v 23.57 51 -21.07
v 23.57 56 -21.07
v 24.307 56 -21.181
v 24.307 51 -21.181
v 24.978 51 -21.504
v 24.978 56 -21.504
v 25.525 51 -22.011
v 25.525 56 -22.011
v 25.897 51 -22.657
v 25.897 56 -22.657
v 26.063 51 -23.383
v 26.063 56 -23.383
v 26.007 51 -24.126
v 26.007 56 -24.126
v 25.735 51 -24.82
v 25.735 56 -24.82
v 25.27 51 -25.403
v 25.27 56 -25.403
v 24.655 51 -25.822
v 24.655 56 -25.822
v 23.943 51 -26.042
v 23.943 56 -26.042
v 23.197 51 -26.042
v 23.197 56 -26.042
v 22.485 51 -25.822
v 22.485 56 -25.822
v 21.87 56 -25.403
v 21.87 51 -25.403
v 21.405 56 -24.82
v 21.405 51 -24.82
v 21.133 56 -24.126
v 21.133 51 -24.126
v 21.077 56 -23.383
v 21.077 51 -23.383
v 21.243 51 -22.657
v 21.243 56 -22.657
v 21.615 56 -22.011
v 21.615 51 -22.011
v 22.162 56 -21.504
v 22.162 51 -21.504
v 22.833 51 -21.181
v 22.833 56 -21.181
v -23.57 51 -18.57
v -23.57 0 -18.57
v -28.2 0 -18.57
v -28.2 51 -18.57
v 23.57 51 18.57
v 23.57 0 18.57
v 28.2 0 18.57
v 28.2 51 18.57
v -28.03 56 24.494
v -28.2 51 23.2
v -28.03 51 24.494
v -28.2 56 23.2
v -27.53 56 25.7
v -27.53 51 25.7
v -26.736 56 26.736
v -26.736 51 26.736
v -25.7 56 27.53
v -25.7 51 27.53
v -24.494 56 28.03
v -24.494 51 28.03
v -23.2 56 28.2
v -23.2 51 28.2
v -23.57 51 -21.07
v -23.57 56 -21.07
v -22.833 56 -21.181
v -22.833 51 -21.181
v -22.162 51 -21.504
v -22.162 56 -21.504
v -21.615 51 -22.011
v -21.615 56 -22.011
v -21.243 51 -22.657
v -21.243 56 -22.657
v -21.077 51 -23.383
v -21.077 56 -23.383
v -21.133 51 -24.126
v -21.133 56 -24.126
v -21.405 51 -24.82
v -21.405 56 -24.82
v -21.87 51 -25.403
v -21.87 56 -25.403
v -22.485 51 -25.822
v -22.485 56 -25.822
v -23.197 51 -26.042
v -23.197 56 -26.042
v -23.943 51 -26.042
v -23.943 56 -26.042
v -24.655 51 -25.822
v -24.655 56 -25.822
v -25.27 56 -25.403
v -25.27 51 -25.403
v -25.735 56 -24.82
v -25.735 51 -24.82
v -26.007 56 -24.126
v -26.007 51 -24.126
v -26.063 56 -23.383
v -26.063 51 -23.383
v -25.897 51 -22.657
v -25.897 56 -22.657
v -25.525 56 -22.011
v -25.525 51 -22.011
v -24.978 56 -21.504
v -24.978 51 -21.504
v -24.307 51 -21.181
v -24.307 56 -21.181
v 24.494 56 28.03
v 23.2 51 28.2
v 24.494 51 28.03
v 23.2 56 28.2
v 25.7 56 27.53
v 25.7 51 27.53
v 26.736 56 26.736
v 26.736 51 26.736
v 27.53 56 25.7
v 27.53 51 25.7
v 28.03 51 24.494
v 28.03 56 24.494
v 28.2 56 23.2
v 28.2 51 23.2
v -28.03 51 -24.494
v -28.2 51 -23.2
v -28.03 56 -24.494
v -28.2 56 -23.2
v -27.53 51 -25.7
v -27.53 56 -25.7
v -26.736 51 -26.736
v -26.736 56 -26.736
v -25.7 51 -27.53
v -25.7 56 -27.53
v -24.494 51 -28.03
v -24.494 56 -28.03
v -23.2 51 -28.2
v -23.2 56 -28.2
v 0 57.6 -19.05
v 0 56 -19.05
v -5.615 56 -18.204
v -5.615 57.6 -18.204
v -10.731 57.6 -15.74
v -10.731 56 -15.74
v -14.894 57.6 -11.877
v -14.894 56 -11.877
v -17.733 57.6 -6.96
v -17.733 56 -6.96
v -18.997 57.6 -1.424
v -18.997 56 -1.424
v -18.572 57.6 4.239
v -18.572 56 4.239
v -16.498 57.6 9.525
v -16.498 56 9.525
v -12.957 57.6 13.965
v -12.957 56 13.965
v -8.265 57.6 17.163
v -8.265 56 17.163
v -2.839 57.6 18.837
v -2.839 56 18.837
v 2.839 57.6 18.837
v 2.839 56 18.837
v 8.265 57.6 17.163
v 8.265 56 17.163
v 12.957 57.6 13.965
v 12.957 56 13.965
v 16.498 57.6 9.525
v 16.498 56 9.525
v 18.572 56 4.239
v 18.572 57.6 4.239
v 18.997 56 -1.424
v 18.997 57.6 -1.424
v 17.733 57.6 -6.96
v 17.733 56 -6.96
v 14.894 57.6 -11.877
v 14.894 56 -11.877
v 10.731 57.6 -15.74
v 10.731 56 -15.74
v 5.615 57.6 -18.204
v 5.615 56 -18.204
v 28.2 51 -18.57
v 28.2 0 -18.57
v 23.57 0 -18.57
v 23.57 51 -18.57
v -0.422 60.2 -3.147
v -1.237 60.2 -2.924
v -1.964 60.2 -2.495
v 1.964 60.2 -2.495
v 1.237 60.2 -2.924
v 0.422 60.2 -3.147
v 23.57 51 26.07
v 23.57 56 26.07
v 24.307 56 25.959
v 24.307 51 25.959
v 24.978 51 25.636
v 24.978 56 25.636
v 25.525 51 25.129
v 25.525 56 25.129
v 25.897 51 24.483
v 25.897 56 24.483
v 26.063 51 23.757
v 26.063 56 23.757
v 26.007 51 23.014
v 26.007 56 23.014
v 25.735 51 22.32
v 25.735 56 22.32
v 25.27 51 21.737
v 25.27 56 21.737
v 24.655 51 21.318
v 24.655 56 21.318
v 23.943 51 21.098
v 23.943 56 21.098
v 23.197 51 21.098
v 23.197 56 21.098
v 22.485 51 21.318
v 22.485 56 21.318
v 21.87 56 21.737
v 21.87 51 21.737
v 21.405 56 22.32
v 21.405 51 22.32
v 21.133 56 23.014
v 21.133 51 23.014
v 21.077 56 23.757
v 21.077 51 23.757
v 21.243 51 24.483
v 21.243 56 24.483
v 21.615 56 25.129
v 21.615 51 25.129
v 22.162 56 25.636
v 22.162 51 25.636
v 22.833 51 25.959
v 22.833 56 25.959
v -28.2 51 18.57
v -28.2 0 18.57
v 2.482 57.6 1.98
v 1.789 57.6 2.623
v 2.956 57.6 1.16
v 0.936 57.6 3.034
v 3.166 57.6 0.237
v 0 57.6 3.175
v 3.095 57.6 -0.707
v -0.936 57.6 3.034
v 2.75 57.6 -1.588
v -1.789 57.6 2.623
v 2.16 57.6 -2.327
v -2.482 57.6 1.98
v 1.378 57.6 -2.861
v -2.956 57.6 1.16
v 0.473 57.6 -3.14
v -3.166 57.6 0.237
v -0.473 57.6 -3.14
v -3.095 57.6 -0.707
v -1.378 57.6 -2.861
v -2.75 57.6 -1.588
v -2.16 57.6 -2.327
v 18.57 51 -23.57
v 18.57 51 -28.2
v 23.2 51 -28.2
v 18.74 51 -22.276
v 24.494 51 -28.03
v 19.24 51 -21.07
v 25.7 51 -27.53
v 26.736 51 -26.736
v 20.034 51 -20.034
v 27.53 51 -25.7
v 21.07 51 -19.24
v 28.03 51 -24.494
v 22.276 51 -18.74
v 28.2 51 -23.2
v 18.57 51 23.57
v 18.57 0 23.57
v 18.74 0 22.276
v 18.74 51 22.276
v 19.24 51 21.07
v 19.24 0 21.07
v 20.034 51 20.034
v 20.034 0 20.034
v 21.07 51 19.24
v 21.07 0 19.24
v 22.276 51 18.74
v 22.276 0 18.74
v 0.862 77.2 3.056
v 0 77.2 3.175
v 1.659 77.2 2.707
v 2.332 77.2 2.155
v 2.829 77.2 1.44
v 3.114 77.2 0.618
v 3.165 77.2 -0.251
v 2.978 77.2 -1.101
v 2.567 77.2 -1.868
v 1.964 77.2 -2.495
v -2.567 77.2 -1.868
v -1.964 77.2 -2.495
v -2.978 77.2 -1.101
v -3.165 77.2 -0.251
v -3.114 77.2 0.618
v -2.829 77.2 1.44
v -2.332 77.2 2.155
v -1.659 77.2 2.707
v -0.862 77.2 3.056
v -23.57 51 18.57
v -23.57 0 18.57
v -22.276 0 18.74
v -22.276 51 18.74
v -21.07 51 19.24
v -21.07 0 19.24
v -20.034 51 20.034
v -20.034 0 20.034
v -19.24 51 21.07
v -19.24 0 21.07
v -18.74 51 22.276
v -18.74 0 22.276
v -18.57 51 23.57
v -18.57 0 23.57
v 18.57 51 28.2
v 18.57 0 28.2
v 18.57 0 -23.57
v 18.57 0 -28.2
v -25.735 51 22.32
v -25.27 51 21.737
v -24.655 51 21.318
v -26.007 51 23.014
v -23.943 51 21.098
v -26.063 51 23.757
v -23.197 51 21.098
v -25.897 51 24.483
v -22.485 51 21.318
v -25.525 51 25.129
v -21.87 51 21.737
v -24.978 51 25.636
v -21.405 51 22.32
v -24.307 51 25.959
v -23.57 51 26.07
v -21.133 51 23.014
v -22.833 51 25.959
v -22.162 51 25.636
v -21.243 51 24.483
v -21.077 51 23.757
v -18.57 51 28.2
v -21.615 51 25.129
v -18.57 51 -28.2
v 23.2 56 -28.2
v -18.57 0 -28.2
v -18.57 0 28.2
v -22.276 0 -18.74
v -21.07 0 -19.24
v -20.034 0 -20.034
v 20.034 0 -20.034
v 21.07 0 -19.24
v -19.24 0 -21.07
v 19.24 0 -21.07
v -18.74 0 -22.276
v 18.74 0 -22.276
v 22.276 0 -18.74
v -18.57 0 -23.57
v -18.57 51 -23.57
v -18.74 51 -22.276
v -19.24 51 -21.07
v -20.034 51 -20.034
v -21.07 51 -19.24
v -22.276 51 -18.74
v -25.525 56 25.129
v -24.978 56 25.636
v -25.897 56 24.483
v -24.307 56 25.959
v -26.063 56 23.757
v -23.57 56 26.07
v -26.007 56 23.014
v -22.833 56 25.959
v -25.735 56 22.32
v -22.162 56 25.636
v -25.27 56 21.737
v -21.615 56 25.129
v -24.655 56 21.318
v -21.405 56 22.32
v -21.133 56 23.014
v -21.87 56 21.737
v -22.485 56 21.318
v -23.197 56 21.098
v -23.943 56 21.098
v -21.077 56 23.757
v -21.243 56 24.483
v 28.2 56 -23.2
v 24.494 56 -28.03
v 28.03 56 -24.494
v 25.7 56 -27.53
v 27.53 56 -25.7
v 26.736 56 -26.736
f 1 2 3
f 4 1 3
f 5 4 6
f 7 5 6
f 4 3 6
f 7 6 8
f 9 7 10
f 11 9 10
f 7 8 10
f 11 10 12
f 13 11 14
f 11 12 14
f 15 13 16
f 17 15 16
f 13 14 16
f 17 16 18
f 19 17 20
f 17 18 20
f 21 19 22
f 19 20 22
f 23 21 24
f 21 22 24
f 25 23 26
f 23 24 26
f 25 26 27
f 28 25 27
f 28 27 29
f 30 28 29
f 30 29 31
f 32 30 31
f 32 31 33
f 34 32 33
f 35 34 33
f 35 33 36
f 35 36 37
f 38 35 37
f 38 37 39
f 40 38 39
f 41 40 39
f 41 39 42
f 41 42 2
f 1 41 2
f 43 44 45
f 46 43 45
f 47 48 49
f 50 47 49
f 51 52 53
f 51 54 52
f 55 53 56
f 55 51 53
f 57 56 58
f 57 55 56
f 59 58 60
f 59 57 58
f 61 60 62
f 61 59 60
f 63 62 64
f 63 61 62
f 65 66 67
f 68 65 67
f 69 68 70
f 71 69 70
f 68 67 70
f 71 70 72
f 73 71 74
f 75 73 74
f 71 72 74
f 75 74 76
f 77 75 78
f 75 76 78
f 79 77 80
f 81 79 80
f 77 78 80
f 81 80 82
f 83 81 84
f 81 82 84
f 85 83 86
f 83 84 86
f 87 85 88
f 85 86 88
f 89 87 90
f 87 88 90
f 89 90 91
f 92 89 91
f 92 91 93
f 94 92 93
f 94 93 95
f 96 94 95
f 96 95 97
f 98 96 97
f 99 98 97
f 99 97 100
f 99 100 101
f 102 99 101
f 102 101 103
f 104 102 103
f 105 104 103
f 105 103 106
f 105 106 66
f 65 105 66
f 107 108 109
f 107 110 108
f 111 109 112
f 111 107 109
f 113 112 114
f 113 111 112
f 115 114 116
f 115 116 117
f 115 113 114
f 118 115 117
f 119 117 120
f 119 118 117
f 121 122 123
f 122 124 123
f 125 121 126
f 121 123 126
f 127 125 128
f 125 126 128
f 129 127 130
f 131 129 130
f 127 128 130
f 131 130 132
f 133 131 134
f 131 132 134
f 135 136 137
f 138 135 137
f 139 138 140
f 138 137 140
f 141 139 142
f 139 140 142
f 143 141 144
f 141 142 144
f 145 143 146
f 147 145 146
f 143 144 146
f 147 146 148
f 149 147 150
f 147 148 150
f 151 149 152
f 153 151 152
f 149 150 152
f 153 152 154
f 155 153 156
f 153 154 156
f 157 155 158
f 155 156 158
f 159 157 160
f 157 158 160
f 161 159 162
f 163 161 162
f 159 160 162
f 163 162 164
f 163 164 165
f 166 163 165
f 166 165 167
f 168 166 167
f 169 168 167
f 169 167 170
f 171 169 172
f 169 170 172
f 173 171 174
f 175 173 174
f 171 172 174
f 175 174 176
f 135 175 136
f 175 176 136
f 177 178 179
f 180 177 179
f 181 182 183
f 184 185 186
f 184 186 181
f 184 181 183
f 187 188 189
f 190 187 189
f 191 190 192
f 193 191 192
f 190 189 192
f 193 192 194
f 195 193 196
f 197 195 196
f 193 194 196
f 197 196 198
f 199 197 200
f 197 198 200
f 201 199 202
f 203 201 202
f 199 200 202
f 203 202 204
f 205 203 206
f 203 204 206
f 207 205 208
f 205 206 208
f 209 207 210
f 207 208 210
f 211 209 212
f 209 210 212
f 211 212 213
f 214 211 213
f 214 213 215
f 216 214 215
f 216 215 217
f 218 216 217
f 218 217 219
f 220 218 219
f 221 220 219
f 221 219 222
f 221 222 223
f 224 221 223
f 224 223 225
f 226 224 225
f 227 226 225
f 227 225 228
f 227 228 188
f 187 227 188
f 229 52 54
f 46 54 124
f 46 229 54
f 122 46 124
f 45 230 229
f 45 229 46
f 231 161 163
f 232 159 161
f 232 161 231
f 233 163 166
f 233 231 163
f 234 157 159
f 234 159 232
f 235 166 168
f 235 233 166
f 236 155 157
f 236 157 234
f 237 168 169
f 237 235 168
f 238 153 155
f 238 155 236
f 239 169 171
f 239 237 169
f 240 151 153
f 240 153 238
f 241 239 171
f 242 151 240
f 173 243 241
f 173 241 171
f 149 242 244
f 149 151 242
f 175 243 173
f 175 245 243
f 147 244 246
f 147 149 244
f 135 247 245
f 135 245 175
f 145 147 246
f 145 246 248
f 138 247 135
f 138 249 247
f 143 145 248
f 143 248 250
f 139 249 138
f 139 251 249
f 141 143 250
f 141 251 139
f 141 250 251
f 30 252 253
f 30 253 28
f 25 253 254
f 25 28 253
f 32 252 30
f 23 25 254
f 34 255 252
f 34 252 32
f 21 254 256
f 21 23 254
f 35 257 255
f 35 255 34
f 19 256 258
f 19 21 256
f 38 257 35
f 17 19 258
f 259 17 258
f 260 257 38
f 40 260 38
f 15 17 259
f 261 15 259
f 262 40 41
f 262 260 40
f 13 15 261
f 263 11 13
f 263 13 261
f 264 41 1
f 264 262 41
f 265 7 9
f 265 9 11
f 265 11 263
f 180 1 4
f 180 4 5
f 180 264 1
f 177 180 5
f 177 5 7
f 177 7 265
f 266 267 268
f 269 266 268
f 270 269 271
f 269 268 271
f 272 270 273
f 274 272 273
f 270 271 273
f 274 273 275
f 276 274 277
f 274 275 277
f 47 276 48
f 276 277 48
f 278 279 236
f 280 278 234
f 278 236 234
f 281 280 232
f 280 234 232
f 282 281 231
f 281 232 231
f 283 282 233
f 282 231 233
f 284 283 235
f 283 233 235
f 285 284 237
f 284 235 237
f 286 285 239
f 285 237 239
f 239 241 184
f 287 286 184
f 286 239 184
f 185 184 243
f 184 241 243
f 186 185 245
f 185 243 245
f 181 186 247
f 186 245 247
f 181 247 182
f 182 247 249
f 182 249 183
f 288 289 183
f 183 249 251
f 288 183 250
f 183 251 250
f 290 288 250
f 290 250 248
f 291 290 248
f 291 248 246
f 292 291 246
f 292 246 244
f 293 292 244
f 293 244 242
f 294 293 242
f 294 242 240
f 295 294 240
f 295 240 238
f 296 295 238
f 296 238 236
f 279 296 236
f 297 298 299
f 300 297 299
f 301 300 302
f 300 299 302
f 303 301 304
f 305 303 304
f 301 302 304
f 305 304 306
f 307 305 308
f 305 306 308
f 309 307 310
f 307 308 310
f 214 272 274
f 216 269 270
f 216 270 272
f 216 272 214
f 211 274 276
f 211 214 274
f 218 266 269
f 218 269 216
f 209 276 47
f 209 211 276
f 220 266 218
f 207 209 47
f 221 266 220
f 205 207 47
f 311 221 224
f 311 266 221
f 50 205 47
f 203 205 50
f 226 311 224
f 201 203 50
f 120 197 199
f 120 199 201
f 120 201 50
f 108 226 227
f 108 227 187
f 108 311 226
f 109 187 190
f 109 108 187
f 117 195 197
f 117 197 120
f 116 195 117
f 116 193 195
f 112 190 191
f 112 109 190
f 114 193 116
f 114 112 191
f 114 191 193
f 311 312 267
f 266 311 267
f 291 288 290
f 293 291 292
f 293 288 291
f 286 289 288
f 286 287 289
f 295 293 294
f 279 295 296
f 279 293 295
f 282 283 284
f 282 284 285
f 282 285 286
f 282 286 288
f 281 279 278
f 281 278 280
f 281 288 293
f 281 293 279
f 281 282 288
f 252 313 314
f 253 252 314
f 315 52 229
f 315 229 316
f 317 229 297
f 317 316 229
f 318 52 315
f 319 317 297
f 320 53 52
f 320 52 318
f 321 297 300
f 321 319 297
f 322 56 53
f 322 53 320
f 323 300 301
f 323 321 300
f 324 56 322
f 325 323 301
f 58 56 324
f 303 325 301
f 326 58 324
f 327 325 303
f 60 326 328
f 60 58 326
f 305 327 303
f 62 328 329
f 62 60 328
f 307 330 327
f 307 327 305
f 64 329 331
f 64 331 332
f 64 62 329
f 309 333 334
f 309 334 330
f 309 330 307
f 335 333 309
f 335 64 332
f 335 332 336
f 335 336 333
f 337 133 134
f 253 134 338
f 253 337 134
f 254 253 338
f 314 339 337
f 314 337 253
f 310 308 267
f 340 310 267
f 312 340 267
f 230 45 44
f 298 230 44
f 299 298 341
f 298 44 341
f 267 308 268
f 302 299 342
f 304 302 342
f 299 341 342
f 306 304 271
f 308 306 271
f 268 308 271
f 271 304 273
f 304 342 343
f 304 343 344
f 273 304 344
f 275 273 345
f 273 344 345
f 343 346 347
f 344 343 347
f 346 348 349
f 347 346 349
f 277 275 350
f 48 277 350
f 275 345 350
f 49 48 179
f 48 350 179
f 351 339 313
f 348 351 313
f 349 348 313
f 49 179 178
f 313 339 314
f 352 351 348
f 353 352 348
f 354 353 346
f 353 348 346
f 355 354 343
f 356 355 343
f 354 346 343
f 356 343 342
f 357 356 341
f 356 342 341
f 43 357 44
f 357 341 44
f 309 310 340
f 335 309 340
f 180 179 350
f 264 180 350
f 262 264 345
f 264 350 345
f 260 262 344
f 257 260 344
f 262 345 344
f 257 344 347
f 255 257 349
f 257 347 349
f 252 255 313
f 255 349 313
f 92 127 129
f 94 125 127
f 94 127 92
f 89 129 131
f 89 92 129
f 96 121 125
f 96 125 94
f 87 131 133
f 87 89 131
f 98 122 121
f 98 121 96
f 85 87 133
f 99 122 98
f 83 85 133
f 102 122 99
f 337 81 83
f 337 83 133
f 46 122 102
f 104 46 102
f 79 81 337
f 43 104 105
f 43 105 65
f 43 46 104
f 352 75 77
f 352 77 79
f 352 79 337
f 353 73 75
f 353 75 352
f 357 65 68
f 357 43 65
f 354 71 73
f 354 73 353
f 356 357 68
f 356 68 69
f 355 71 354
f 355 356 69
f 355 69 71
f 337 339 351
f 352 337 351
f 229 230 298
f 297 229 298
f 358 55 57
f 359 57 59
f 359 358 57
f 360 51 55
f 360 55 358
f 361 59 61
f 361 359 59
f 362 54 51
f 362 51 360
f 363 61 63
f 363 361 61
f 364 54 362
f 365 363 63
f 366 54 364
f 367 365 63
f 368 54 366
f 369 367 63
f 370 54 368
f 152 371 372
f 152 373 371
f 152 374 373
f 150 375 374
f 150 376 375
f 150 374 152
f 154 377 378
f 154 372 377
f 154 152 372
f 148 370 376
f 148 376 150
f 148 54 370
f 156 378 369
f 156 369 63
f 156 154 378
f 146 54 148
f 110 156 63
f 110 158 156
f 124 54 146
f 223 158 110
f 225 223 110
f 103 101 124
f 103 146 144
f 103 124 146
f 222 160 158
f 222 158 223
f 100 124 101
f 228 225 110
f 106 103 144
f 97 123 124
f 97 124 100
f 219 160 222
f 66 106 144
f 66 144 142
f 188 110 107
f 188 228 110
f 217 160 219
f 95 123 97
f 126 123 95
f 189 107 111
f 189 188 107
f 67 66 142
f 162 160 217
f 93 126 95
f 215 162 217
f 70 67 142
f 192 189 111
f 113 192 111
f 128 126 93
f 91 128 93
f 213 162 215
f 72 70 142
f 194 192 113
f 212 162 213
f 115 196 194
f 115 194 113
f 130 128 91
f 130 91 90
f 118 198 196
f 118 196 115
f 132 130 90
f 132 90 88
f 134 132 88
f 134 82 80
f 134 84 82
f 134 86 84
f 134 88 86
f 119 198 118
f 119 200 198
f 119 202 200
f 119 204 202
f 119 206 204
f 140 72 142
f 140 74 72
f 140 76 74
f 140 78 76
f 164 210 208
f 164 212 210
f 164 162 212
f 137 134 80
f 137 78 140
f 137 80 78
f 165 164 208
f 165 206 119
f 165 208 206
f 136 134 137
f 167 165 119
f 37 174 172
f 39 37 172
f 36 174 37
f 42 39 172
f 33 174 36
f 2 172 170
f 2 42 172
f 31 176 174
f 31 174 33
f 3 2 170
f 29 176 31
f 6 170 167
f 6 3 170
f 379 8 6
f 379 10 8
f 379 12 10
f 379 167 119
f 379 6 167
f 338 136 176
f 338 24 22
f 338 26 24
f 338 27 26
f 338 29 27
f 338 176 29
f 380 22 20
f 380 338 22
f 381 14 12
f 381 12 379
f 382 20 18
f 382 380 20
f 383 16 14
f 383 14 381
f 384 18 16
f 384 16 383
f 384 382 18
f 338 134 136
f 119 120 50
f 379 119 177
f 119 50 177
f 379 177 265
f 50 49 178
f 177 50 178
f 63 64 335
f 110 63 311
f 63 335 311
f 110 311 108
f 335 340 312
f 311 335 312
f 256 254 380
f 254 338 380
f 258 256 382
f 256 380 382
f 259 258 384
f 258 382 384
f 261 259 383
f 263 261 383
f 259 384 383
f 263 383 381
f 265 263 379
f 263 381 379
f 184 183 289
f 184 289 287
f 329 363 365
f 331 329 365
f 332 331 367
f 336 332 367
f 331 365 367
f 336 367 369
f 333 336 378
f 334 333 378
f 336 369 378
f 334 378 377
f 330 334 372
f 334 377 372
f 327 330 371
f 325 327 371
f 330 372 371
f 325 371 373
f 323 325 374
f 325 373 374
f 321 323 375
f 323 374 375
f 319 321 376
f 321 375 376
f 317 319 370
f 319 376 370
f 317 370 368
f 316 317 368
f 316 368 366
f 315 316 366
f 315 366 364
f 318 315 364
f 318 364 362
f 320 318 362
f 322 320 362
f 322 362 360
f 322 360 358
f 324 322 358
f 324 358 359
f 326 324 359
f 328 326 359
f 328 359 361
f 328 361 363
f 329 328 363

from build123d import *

# Parameters (mm, degrees)
SKETCH1_W           = 56.4
SKETCH1_H           = 56.4
BOSS_EXTRUDE1_DEPTH = 56
SKETCH2_R           = 2.5
CUT_EXTRUDE1_DEPTH  = 56
CUT_EXTRUDE2_DEPTH  = 51
FILLET1_R           = 5
SKETCH5_R           = 19.05
BOSS_EXTRUDE2_DEPTH = 1.6
SKETCH6_R           = 3.175
BOSS_EXTRUDE3_DEPTH = 19.6
CUT_EXTRUDE3_START  = -17
CUT_EXTRUDE3_DEPTH  = 17


with BuildPart() as part:
    # Sketch1 → Boss-Extrude1 (new body)
    with BuildSketch(Plane(origin=(0, 0, 0), x_dir=(1, 0, 0), z_dir=(0, 1, 0))):
        Rectangle(SKETCH1_W, SKETCH1_H)
    extrude(amount=BOSS_EXTRUDE1_DEPTH)

    # Sketch2 → Cut-Extrude1 (cut)
    with BuildSketch(Plane(origin=(0, 56, 0), x_dir=(1, 0, 0), z_dir=(0, 1, 0))):
        with Locations(Location((-23.57, 23.57, 0), (0, 0, 270))):
            Circle(SKETCH2_R)
        with Locations(Location((23.57, 23.57, 0), (0, 0, 270))):
            Circle(SKETCH2_R)
        with Locations(Location((23.57, -23.57, 0), (0, 0, 270))):
            Circle(SKETCH2_R)
        with Locations(Location((-23.57, -23.57, 0), (0, 0, 270))):
            Circle(SKETCH2_R)
    extrude(amount=-CUT_EXTRUDE1_DEPTH, mode=Mode.SUBTRACT)

    # Sketch4 → Cut-Extrude2 (cut)
    with BuildSketch(Plane.XZ):
        with BuildLine():
            Line((-18.57, 23.57), (-18.57, 28.2))
            Line((-18.57, 28.2), (-28.2, 28.2))
            Line((-28.2, 28.2), (-28.2, 18.57))
            Line((-28.2, 18.57), (-23.57, 18.57))
            ThreePointArc((-23.57, 18.57), (-20.034466094, 20.034466094), (-18.57, 23.57))
        make_face()
        with BuildLine():
            Line((23.57, 18.57), (28.2, 18.57))
            Line((28.2, 18.57), (28.2, 28.2))
            Line((28.2, 28.2), (18.57, 28.2))
            Line((18.57, 28.2), (18.57, 23.57))
            ThreePointArc((18.57, 23.57), (20.034466094, 20.034466094), (23.57, 18.57))
        make_face()
        with BuildLine():
            Line((18.57, -23.57), (18.57, -28.2))
            Line((18.57, -28.2), (28.2, -28.2))
            Line((28.2, -28.2), (28.2, -18.57))
            Line((28.2, -18.57), (23.57, -18.57))
            ThreePointArc((23.57, -18.57), (20.034466094, -20.034466094), (18.57, -23.57))
        make_face()
        with BuildLine():
            Line((-23.57, -18.57), (-28.2, -18.57))
            Line((-28.2, -18.57), (-28.2, -28.2))
            Line((-28.2, -28.2), (-18.57, -28.2))
            Line((-18.57, -28.2), (-18.57, -23.57))
            ThreePointArc((-18.57, -23.57), (-20.034466094, -20.034466094), (-23.57, -18.57))
        make_face()
    extrude(amount=-CUT_EXTRUDE2_DEPTH, mode=Mode.SUBTRACT)

    # Fillet1
    fillet1_edges = [part.edges().sort_by_distance(p)[0] for p in [
        (28.2, 53.5, 28.2),
        (-28.2, 53.5, 28.2),
        (-28.2, 53.5, -28.2),
        (28.2, 53.5, -28.2),
    ]]
    fillet(fillet1_edges, radius=FILLET1_R)

    # Sketch5 → Boss-Extrude2 (add)
    with BuildSketch(Plane(origin=(0, 56, 0), x_dir=(1, 0, 0), z_dir=(0, 1, 0))):
        with Locations(Location((0, 0, 0), (0, 0, 90))):
            Circle(SKETCH5_R)
    extrude(amount=BOSS_EXTRUDE2_DEPTH)

    # Sketch6 → Boss-Extrude3 (add)
    with BuildSketch(Plane(origin=(0, 57.6, 0), x_dir=(1, 0, 0), z_dir=(0, 1, 0))):
        with Locations(Location((0, 0, 0), (0, 0, 270))):
            Circle(SKETCH6_R)
    extrude(amount=BOSS_EXTRUDE3_DEPTH)

    # Sketch7 → Cut-Extrude3 (cut)
    with BuildSketch(Plane(origin=(0, 77.2, 0), x_dir=(1, 0, 0), z_dir=(0, 1, 0)).offset(CUT_EXTRUDE3_START)):
        with BuildLine():
            Line((-1.963568181, 2.495), (1.963568181, 2.495))
            ThreePointArc((1.963568181, 2.495), (0, 3.175), (-1.963568181, 2.495))
        make_face()
    extrude(amount=CUT_EXTRUDE3_DEPTH, mode=Mode.SUBTRACT)


solid = part.part
